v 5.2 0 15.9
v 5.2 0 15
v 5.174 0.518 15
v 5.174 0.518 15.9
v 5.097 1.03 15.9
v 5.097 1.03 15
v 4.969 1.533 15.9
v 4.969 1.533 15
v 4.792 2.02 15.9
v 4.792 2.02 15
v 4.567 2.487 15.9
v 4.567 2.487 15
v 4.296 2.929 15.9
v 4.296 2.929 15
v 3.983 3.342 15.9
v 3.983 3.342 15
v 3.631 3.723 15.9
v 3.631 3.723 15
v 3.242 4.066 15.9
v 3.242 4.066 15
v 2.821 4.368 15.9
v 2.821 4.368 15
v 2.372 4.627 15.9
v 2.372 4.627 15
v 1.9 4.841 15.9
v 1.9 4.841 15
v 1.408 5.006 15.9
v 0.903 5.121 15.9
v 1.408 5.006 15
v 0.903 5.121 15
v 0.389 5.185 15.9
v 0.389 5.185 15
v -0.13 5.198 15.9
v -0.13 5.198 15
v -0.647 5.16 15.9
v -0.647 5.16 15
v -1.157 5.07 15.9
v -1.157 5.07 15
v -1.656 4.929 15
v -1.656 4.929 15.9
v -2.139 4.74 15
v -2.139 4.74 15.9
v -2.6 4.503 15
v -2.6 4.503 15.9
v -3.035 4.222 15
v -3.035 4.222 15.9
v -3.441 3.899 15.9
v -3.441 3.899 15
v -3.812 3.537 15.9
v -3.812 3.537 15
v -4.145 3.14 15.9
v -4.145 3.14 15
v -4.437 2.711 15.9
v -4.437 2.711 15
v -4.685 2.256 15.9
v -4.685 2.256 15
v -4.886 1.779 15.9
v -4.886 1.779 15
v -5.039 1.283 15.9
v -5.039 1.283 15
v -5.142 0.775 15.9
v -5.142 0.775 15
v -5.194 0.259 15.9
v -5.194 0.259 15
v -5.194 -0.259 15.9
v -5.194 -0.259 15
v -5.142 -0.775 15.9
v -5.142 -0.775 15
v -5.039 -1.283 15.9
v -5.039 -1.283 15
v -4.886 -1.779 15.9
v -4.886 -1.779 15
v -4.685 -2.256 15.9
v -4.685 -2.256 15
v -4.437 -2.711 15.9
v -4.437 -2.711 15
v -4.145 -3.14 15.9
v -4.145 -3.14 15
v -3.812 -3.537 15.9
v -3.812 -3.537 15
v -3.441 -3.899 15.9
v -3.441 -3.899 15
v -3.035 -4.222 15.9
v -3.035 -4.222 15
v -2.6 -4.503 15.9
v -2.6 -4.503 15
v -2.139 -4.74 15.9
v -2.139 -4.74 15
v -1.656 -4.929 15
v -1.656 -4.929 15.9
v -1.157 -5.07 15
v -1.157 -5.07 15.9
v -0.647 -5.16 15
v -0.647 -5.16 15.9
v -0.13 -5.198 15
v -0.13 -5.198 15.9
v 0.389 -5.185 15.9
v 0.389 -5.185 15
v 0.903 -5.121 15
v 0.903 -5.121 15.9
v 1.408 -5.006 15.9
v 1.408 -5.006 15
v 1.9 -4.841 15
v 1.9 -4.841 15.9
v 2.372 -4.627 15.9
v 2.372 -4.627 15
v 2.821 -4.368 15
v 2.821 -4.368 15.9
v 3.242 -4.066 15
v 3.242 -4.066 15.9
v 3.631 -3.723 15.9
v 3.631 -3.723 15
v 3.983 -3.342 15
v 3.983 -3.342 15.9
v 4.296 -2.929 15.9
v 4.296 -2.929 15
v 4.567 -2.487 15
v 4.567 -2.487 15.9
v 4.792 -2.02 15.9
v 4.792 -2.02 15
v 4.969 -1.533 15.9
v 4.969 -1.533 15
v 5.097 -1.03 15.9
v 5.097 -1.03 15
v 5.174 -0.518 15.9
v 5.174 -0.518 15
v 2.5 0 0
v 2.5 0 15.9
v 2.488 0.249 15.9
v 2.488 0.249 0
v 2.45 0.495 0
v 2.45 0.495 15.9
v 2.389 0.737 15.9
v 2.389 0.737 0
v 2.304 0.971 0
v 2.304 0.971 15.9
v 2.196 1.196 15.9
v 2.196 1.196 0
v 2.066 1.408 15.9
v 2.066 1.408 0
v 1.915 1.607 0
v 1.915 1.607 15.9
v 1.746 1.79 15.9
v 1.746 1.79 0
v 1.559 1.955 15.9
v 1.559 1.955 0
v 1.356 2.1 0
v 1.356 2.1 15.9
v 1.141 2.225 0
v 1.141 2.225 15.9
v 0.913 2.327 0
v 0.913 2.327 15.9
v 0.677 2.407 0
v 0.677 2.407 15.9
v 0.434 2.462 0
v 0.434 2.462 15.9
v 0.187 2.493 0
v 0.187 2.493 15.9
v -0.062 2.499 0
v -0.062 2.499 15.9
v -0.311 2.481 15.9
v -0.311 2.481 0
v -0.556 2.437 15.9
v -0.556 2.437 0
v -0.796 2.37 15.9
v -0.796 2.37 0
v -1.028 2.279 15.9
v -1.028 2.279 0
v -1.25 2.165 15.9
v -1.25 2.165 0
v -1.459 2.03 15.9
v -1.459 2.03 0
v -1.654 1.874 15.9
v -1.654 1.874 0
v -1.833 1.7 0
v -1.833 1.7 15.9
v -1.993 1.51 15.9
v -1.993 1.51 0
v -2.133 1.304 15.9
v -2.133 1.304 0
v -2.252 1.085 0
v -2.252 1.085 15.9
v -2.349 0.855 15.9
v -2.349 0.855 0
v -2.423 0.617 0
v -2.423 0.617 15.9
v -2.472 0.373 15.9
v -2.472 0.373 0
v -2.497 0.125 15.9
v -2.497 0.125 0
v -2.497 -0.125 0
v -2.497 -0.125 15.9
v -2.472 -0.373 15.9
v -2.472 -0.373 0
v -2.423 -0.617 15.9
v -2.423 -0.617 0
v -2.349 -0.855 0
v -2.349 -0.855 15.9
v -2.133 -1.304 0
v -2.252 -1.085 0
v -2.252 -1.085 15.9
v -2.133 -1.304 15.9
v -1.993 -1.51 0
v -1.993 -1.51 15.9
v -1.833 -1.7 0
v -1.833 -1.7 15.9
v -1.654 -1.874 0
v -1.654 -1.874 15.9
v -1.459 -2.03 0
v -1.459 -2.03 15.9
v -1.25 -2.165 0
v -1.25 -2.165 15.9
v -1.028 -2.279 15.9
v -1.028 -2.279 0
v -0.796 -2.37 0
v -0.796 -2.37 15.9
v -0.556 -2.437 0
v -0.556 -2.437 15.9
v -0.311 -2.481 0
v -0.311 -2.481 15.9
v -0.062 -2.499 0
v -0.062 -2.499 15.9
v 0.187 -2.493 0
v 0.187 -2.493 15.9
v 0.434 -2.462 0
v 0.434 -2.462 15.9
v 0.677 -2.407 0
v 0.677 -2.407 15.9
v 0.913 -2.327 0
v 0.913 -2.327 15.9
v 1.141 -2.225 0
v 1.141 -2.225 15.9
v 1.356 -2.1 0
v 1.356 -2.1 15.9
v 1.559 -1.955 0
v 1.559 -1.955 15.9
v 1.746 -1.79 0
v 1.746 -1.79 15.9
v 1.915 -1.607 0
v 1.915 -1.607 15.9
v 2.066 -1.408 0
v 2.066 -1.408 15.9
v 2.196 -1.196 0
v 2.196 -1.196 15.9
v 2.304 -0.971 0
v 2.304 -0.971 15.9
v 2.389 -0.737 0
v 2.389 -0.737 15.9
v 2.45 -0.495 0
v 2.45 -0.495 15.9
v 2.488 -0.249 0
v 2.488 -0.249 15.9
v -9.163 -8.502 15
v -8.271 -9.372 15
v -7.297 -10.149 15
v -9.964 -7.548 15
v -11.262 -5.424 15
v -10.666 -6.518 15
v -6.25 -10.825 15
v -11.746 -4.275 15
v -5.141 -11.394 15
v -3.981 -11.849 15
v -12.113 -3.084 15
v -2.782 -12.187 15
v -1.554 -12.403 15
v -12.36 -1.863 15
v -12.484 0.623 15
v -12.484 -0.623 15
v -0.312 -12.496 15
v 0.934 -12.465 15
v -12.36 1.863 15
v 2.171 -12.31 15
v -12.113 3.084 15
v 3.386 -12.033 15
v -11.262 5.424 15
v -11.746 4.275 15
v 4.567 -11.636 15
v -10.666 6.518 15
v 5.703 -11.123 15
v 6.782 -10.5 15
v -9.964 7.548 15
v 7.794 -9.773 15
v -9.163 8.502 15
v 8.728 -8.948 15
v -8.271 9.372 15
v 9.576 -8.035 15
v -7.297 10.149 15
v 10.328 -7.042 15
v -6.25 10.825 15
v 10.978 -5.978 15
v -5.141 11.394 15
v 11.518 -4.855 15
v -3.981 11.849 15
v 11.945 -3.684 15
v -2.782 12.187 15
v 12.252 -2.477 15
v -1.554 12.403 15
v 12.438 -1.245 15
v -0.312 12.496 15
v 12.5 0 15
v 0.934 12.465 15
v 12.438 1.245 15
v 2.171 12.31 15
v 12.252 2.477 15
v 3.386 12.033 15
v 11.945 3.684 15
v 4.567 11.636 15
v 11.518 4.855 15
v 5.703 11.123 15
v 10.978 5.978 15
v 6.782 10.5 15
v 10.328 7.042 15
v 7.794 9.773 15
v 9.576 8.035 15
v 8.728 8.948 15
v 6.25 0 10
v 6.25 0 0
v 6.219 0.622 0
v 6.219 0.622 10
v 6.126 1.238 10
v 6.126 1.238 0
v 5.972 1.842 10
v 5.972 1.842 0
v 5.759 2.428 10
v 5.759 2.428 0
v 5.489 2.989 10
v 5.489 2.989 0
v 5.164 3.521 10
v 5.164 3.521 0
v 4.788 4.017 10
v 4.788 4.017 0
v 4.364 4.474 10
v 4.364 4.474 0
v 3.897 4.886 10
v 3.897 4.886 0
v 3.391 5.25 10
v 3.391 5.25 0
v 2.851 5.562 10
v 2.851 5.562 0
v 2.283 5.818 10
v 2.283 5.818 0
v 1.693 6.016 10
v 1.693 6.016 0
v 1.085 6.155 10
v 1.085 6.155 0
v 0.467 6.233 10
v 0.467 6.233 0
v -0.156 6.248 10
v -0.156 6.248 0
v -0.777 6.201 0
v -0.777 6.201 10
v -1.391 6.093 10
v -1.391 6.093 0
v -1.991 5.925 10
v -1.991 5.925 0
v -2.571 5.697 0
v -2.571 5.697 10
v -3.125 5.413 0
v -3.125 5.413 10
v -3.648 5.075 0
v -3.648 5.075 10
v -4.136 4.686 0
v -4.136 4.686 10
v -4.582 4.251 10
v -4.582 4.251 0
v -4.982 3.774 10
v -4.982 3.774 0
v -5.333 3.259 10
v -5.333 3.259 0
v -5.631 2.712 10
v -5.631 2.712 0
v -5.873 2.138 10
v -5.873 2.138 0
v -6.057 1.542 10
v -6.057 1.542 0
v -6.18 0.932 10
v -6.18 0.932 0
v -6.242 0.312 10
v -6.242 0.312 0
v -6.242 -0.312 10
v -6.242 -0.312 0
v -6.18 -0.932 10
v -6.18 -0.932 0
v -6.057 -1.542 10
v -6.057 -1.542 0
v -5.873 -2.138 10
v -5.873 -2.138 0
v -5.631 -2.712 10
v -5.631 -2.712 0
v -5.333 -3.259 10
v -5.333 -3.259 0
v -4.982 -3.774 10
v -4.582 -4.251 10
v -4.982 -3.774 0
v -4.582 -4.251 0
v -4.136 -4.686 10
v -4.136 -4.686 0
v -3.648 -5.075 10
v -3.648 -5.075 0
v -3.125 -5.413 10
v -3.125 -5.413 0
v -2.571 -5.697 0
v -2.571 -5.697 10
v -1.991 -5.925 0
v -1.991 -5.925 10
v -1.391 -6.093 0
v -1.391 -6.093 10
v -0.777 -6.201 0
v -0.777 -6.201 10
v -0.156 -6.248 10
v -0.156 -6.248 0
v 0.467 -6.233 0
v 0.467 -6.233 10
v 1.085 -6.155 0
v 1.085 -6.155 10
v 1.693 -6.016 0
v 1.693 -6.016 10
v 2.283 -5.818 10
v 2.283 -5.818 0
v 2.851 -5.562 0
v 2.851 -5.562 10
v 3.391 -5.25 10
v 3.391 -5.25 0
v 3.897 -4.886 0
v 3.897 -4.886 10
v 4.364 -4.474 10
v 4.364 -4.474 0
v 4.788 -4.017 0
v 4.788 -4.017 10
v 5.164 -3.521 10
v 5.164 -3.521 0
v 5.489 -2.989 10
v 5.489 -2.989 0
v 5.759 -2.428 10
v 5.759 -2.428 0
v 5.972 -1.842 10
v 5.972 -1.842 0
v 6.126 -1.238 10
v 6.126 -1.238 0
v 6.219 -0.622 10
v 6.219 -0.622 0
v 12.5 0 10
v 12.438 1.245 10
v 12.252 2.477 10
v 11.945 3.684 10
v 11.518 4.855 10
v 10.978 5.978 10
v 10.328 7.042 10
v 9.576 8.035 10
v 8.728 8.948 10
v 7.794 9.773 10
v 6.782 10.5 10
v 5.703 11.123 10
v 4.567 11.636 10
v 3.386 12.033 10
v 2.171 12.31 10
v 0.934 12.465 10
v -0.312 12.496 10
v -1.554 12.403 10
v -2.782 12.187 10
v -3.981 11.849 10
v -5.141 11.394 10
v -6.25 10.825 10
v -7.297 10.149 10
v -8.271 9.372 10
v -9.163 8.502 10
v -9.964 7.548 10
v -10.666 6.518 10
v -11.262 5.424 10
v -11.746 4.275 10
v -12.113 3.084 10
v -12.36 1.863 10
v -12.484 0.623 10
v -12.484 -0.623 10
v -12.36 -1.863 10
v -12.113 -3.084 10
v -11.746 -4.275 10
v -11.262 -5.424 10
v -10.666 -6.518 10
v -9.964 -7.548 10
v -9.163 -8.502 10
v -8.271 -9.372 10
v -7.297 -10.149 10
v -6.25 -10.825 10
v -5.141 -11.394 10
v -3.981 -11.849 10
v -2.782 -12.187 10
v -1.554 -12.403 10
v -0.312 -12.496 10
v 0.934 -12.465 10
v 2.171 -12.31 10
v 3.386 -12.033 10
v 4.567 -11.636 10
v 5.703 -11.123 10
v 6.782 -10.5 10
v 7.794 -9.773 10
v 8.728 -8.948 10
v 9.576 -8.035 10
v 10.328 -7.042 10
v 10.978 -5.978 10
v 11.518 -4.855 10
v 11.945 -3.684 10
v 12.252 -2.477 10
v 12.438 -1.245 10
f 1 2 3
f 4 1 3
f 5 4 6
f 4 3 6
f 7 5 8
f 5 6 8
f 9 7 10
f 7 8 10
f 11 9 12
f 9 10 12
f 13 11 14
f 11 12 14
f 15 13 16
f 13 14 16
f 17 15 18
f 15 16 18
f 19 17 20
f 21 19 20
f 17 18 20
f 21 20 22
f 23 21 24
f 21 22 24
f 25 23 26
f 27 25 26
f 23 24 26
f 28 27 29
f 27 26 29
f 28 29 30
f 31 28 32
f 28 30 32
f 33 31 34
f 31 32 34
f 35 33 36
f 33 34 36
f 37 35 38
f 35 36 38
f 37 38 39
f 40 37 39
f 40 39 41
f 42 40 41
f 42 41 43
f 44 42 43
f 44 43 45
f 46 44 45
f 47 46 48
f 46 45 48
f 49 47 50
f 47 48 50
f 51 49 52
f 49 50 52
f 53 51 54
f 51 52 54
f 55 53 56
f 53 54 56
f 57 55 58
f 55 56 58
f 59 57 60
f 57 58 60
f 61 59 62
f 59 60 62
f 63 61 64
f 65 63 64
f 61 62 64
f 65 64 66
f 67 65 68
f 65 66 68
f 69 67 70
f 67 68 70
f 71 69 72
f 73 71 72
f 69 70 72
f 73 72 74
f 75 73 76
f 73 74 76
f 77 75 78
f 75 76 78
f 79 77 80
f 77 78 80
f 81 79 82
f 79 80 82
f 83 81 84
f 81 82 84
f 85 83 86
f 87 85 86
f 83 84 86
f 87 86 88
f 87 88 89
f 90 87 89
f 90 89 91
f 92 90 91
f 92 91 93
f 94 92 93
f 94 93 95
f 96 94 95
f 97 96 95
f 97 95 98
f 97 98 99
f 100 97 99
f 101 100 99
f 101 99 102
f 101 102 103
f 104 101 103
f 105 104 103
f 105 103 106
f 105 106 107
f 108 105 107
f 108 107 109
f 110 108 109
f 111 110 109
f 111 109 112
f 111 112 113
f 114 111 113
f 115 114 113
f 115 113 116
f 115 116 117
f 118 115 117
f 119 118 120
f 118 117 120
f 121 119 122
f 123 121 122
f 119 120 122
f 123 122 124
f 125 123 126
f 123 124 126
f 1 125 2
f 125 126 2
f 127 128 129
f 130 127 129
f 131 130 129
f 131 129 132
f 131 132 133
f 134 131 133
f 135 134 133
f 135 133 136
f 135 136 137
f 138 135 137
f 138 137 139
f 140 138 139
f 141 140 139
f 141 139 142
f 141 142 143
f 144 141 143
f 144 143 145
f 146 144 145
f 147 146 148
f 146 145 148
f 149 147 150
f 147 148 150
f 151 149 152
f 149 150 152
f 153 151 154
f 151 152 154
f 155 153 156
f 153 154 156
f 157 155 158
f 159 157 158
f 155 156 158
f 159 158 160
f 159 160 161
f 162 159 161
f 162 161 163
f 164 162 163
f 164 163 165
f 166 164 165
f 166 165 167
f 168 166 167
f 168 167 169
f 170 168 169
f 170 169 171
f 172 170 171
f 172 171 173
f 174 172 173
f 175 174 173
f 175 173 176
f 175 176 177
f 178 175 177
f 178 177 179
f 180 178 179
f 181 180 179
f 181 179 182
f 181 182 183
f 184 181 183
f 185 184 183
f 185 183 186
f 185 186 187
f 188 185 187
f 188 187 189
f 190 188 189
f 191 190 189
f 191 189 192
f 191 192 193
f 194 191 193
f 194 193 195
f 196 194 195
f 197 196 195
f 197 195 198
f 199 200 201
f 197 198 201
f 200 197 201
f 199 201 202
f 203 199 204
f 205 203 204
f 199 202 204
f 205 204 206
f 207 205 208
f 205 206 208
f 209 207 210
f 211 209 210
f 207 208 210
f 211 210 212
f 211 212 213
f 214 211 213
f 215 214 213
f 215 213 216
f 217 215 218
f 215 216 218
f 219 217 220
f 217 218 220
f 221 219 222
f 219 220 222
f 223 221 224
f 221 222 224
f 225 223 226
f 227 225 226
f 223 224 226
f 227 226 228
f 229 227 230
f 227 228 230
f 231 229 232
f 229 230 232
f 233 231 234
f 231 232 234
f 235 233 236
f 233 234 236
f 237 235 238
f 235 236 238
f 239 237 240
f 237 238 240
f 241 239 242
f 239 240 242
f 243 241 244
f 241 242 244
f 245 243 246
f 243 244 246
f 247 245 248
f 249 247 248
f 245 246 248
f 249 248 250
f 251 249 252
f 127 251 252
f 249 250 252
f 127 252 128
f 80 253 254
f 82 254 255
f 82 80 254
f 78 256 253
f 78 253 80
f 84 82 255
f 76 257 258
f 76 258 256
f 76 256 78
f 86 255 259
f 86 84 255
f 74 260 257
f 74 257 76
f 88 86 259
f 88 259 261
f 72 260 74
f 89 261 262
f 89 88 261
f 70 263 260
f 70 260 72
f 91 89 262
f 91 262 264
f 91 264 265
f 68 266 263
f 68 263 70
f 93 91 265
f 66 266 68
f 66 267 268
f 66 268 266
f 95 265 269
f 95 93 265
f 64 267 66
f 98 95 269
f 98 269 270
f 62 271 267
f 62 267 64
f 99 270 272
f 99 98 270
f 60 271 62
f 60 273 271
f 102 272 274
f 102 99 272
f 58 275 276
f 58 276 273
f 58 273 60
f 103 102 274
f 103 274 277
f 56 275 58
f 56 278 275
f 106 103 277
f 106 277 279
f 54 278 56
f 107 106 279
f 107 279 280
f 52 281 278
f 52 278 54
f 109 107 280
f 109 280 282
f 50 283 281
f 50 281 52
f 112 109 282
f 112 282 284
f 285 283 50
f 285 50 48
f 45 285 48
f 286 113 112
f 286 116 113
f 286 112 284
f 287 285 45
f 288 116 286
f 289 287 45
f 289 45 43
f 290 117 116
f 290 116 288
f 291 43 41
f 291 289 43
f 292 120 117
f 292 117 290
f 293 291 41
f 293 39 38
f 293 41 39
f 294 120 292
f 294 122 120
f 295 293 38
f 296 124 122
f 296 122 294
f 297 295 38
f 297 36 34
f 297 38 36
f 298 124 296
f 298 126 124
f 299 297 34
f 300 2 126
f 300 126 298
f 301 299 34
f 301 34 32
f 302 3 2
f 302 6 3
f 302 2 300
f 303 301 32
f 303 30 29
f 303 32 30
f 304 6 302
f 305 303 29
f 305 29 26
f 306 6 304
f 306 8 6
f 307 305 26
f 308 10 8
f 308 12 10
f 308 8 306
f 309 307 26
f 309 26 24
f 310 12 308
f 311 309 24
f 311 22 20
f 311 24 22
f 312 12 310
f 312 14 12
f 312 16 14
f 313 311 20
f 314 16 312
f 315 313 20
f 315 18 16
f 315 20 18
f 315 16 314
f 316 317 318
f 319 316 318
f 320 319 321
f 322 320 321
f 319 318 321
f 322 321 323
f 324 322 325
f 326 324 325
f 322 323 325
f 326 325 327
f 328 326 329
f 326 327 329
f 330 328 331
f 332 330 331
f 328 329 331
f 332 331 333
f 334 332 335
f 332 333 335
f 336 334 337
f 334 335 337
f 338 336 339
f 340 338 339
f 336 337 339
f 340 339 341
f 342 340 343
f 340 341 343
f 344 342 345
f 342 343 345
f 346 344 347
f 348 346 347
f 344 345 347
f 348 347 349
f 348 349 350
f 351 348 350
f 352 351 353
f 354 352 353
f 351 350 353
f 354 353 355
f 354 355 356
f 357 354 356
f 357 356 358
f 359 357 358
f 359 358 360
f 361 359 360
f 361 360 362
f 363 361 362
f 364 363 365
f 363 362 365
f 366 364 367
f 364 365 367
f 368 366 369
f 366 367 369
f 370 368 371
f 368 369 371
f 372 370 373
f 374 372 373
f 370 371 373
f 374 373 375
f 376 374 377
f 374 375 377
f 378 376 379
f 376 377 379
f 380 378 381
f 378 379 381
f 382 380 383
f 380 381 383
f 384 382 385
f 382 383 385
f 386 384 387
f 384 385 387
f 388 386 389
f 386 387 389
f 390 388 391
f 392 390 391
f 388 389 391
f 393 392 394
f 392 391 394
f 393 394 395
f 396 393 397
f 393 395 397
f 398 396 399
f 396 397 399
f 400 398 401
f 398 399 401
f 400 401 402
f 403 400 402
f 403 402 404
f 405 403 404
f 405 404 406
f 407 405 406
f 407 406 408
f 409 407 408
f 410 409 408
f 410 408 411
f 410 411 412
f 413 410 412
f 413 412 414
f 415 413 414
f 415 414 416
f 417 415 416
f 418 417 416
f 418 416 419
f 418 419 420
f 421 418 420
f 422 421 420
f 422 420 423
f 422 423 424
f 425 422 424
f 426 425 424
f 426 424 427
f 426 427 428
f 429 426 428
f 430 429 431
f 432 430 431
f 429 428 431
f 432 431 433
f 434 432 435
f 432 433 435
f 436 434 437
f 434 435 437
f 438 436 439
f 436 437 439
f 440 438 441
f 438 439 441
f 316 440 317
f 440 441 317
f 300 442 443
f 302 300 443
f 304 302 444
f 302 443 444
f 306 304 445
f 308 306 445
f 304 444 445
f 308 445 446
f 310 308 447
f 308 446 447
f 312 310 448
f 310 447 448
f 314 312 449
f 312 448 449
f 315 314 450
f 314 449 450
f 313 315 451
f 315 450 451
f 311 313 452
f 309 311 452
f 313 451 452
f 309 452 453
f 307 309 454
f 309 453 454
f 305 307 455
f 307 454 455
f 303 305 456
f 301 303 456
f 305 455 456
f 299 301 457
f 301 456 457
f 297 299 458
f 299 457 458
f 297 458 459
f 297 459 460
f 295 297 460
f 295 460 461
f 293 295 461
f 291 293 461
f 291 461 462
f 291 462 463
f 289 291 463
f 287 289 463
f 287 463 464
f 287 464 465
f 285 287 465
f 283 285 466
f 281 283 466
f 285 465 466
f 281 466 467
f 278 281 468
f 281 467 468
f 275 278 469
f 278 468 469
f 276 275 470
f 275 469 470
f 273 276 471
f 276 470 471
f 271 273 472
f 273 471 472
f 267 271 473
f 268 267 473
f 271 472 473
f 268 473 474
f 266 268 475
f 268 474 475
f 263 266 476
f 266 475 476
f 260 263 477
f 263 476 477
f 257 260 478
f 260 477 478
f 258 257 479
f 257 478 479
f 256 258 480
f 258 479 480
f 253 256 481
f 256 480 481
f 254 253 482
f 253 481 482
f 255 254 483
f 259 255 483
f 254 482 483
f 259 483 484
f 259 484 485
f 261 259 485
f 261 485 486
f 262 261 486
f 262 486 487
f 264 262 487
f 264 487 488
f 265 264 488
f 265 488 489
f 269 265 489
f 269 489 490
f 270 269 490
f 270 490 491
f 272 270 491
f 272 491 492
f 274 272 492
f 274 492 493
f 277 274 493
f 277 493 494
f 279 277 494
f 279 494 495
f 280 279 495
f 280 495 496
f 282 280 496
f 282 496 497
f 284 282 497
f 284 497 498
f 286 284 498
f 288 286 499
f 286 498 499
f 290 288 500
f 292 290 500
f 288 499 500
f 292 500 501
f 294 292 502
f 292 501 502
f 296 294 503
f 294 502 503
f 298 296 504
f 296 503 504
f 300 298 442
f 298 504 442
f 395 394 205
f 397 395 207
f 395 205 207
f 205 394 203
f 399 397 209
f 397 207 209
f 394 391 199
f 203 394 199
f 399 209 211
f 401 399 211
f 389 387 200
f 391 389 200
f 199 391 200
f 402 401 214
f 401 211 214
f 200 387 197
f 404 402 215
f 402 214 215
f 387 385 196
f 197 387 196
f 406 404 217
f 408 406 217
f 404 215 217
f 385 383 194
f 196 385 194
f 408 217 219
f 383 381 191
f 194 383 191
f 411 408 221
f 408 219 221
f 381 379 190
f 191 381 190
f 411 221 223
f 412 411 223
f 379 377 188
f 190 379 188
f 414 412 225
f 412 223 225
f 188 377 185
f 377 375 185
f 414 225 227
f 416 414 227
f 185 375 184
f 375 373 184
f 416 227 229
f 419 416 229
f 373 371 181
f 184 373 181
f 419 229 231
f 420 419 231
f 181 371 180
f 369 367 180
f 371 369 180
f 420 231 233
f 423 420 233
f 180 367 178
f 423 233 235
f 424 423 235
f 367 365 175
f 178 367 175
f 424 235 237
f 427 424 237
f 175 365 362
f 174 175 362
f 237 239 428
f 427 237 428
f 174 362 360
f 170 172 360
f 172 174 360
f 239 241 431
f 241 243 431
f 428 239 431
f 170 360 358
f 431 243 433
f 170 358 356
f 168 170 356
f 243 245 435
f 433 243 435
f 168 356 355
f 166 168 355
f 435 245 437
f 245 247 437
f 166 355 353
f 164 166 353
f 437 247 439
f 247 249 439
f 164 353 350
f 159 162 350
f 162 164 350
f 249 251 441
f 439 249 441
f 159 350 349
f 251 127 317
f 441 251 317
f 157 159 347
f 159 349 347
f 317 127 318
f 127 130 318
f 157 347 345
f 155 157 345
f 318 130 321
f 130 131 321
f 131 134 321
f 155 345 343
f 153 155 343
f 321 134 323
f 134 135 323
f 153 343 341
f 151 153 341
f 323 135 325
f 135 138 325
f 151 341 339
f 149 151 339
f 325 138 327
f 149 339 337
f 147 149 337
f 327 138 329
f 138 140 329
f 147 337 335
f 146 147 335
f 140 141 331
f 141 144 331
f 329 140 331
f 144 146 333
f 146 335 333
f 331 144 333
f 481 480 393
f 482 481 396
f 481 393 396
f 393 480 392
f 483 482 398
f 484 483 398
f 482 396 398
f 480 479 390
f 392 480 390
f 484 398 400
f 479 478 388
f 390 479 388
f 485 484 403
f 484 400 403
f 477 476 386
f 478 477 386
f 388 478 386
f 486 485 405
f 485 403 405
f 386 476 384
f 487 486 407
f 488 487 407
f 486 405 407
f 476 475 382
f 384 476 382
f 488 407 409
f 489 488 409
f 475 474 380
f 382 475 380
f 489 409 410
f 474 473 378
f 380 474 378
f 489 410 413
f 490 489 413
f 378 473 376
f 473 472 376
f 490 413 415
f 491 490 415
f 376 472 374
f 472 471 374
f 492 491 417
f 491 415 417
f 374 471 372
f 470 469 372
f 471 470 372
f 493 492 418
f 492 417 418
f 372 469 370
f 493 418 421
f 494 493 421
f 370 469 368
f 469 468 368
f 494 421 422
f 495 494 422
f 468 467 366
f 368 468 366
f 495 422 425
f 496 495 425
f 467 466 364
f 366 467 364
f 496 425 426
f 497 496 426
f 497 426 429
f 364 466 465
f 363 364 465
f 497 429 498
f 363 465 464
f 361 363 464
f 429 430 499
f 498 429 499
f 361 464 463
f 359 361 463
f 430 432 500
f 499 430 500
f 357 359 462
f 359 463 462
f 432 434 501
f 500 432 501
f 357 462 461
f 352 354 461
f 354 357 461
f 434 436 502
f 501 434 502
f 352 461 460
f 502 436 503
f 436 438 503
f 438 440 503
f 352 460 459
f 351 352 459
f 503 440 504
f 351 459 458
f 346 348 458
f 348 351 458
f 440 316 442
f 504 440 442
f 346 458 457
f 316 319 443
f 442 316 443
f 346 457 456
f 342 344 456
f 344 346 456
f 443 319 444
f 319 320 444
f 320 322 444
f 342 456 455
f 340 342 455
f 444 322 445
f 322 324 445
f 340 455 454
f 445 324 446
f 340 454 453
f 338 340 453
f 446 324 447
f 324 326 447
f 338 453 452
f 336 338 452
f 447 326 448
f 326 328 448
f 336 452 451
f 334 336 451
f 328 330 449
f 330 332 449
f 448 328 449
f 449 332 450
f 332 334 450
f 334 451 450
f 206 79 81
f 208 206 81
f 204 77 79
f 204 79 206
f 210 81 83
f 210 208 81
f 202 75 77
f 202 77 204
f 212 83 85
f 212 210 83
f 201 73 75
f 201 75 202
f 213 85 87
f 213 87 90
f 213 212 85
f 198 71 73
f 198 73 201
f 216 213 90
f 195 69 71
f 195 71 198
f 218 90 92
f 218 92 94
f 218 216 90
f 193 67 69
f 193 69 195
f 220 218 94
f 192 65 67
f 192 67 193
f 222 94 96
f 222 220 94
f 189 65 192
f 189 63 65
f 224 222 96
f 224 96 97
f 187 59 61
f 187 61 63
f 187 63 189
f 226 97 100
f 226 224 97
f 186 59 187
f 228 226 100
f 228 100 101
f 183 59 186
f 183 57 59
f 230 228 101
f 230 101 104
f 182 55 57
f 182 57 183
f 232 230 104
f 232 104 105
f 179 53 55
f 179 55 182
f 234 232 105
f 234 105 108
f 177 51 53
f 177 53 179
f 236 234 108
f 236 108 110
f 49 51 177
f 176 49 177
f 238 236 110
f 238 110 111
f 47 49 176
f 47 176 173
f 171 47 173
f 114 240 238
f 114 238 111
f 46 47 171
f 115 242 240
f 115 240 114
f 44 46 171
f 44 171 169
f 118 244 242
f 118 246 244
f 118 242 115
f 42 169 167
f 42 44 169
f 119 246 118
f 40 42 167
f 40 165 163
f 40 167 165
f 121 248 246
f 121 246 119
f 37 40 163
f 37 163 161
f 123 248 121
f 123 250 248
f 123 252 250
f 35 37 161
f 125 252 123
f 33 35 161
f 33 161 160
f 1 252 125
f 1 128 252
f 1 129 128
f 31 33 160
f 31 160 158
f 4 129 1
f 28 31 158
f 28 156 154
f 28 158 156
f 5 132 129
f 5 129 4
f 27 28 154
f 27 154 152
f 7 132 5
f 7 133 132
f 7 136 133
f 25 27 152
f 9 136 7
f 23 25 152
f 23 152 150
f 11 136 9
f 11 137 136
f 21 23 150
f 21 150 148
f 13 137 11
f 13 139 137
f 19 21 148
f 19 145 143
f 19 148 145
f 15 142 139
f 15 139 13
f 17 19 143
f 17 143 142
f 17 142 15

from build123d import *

# Parameters (mm, degrees)
SKETCH019_R   = 6.25
PAD007_DEPTH  = 10
SKETCH020_R   = 12.5
PAD008_DEPTH  = 5
SKETCH021_R   = 5.2
PAD009_DEPTH  = 0.9
SKETCH022_R   = 2.5
HOLE006_DEPTH = 25


with BuildPart() as part:
    # Sketch019 → Pad007 (new body)
    with BuildSketch(Plane.XY):
        Circle(SKETCH019_R)
    extrude(amount=PAD007_DEPTH)

    # Sketch020 (on Face3 of Pad007) → Pad008 (join)
    with BuildSketch(Plane.XY.offset(10)):
        Circle(SKETCH020_R)
    extrude(amount=PAD008_DEPTH)

    # Sketch021 (on Face3 of Pad008) → Pad009 (join)
    with BuildSketch(Plane.XY.offset(15)):
        Circle(SKETCH021_R)
    extrude(amount=PAD009_DEPTH)

    # Sketch022 (on Face7 of Pad009) → Hole006 (cut)
    with BuildSketch(Plane.XY.offset(15.9)):
        Circle(SKETCH022_R)
    extrude(amount=-HOLE006_DEPTH, mode=Mode.SUBTRACT)


solid = part.part
